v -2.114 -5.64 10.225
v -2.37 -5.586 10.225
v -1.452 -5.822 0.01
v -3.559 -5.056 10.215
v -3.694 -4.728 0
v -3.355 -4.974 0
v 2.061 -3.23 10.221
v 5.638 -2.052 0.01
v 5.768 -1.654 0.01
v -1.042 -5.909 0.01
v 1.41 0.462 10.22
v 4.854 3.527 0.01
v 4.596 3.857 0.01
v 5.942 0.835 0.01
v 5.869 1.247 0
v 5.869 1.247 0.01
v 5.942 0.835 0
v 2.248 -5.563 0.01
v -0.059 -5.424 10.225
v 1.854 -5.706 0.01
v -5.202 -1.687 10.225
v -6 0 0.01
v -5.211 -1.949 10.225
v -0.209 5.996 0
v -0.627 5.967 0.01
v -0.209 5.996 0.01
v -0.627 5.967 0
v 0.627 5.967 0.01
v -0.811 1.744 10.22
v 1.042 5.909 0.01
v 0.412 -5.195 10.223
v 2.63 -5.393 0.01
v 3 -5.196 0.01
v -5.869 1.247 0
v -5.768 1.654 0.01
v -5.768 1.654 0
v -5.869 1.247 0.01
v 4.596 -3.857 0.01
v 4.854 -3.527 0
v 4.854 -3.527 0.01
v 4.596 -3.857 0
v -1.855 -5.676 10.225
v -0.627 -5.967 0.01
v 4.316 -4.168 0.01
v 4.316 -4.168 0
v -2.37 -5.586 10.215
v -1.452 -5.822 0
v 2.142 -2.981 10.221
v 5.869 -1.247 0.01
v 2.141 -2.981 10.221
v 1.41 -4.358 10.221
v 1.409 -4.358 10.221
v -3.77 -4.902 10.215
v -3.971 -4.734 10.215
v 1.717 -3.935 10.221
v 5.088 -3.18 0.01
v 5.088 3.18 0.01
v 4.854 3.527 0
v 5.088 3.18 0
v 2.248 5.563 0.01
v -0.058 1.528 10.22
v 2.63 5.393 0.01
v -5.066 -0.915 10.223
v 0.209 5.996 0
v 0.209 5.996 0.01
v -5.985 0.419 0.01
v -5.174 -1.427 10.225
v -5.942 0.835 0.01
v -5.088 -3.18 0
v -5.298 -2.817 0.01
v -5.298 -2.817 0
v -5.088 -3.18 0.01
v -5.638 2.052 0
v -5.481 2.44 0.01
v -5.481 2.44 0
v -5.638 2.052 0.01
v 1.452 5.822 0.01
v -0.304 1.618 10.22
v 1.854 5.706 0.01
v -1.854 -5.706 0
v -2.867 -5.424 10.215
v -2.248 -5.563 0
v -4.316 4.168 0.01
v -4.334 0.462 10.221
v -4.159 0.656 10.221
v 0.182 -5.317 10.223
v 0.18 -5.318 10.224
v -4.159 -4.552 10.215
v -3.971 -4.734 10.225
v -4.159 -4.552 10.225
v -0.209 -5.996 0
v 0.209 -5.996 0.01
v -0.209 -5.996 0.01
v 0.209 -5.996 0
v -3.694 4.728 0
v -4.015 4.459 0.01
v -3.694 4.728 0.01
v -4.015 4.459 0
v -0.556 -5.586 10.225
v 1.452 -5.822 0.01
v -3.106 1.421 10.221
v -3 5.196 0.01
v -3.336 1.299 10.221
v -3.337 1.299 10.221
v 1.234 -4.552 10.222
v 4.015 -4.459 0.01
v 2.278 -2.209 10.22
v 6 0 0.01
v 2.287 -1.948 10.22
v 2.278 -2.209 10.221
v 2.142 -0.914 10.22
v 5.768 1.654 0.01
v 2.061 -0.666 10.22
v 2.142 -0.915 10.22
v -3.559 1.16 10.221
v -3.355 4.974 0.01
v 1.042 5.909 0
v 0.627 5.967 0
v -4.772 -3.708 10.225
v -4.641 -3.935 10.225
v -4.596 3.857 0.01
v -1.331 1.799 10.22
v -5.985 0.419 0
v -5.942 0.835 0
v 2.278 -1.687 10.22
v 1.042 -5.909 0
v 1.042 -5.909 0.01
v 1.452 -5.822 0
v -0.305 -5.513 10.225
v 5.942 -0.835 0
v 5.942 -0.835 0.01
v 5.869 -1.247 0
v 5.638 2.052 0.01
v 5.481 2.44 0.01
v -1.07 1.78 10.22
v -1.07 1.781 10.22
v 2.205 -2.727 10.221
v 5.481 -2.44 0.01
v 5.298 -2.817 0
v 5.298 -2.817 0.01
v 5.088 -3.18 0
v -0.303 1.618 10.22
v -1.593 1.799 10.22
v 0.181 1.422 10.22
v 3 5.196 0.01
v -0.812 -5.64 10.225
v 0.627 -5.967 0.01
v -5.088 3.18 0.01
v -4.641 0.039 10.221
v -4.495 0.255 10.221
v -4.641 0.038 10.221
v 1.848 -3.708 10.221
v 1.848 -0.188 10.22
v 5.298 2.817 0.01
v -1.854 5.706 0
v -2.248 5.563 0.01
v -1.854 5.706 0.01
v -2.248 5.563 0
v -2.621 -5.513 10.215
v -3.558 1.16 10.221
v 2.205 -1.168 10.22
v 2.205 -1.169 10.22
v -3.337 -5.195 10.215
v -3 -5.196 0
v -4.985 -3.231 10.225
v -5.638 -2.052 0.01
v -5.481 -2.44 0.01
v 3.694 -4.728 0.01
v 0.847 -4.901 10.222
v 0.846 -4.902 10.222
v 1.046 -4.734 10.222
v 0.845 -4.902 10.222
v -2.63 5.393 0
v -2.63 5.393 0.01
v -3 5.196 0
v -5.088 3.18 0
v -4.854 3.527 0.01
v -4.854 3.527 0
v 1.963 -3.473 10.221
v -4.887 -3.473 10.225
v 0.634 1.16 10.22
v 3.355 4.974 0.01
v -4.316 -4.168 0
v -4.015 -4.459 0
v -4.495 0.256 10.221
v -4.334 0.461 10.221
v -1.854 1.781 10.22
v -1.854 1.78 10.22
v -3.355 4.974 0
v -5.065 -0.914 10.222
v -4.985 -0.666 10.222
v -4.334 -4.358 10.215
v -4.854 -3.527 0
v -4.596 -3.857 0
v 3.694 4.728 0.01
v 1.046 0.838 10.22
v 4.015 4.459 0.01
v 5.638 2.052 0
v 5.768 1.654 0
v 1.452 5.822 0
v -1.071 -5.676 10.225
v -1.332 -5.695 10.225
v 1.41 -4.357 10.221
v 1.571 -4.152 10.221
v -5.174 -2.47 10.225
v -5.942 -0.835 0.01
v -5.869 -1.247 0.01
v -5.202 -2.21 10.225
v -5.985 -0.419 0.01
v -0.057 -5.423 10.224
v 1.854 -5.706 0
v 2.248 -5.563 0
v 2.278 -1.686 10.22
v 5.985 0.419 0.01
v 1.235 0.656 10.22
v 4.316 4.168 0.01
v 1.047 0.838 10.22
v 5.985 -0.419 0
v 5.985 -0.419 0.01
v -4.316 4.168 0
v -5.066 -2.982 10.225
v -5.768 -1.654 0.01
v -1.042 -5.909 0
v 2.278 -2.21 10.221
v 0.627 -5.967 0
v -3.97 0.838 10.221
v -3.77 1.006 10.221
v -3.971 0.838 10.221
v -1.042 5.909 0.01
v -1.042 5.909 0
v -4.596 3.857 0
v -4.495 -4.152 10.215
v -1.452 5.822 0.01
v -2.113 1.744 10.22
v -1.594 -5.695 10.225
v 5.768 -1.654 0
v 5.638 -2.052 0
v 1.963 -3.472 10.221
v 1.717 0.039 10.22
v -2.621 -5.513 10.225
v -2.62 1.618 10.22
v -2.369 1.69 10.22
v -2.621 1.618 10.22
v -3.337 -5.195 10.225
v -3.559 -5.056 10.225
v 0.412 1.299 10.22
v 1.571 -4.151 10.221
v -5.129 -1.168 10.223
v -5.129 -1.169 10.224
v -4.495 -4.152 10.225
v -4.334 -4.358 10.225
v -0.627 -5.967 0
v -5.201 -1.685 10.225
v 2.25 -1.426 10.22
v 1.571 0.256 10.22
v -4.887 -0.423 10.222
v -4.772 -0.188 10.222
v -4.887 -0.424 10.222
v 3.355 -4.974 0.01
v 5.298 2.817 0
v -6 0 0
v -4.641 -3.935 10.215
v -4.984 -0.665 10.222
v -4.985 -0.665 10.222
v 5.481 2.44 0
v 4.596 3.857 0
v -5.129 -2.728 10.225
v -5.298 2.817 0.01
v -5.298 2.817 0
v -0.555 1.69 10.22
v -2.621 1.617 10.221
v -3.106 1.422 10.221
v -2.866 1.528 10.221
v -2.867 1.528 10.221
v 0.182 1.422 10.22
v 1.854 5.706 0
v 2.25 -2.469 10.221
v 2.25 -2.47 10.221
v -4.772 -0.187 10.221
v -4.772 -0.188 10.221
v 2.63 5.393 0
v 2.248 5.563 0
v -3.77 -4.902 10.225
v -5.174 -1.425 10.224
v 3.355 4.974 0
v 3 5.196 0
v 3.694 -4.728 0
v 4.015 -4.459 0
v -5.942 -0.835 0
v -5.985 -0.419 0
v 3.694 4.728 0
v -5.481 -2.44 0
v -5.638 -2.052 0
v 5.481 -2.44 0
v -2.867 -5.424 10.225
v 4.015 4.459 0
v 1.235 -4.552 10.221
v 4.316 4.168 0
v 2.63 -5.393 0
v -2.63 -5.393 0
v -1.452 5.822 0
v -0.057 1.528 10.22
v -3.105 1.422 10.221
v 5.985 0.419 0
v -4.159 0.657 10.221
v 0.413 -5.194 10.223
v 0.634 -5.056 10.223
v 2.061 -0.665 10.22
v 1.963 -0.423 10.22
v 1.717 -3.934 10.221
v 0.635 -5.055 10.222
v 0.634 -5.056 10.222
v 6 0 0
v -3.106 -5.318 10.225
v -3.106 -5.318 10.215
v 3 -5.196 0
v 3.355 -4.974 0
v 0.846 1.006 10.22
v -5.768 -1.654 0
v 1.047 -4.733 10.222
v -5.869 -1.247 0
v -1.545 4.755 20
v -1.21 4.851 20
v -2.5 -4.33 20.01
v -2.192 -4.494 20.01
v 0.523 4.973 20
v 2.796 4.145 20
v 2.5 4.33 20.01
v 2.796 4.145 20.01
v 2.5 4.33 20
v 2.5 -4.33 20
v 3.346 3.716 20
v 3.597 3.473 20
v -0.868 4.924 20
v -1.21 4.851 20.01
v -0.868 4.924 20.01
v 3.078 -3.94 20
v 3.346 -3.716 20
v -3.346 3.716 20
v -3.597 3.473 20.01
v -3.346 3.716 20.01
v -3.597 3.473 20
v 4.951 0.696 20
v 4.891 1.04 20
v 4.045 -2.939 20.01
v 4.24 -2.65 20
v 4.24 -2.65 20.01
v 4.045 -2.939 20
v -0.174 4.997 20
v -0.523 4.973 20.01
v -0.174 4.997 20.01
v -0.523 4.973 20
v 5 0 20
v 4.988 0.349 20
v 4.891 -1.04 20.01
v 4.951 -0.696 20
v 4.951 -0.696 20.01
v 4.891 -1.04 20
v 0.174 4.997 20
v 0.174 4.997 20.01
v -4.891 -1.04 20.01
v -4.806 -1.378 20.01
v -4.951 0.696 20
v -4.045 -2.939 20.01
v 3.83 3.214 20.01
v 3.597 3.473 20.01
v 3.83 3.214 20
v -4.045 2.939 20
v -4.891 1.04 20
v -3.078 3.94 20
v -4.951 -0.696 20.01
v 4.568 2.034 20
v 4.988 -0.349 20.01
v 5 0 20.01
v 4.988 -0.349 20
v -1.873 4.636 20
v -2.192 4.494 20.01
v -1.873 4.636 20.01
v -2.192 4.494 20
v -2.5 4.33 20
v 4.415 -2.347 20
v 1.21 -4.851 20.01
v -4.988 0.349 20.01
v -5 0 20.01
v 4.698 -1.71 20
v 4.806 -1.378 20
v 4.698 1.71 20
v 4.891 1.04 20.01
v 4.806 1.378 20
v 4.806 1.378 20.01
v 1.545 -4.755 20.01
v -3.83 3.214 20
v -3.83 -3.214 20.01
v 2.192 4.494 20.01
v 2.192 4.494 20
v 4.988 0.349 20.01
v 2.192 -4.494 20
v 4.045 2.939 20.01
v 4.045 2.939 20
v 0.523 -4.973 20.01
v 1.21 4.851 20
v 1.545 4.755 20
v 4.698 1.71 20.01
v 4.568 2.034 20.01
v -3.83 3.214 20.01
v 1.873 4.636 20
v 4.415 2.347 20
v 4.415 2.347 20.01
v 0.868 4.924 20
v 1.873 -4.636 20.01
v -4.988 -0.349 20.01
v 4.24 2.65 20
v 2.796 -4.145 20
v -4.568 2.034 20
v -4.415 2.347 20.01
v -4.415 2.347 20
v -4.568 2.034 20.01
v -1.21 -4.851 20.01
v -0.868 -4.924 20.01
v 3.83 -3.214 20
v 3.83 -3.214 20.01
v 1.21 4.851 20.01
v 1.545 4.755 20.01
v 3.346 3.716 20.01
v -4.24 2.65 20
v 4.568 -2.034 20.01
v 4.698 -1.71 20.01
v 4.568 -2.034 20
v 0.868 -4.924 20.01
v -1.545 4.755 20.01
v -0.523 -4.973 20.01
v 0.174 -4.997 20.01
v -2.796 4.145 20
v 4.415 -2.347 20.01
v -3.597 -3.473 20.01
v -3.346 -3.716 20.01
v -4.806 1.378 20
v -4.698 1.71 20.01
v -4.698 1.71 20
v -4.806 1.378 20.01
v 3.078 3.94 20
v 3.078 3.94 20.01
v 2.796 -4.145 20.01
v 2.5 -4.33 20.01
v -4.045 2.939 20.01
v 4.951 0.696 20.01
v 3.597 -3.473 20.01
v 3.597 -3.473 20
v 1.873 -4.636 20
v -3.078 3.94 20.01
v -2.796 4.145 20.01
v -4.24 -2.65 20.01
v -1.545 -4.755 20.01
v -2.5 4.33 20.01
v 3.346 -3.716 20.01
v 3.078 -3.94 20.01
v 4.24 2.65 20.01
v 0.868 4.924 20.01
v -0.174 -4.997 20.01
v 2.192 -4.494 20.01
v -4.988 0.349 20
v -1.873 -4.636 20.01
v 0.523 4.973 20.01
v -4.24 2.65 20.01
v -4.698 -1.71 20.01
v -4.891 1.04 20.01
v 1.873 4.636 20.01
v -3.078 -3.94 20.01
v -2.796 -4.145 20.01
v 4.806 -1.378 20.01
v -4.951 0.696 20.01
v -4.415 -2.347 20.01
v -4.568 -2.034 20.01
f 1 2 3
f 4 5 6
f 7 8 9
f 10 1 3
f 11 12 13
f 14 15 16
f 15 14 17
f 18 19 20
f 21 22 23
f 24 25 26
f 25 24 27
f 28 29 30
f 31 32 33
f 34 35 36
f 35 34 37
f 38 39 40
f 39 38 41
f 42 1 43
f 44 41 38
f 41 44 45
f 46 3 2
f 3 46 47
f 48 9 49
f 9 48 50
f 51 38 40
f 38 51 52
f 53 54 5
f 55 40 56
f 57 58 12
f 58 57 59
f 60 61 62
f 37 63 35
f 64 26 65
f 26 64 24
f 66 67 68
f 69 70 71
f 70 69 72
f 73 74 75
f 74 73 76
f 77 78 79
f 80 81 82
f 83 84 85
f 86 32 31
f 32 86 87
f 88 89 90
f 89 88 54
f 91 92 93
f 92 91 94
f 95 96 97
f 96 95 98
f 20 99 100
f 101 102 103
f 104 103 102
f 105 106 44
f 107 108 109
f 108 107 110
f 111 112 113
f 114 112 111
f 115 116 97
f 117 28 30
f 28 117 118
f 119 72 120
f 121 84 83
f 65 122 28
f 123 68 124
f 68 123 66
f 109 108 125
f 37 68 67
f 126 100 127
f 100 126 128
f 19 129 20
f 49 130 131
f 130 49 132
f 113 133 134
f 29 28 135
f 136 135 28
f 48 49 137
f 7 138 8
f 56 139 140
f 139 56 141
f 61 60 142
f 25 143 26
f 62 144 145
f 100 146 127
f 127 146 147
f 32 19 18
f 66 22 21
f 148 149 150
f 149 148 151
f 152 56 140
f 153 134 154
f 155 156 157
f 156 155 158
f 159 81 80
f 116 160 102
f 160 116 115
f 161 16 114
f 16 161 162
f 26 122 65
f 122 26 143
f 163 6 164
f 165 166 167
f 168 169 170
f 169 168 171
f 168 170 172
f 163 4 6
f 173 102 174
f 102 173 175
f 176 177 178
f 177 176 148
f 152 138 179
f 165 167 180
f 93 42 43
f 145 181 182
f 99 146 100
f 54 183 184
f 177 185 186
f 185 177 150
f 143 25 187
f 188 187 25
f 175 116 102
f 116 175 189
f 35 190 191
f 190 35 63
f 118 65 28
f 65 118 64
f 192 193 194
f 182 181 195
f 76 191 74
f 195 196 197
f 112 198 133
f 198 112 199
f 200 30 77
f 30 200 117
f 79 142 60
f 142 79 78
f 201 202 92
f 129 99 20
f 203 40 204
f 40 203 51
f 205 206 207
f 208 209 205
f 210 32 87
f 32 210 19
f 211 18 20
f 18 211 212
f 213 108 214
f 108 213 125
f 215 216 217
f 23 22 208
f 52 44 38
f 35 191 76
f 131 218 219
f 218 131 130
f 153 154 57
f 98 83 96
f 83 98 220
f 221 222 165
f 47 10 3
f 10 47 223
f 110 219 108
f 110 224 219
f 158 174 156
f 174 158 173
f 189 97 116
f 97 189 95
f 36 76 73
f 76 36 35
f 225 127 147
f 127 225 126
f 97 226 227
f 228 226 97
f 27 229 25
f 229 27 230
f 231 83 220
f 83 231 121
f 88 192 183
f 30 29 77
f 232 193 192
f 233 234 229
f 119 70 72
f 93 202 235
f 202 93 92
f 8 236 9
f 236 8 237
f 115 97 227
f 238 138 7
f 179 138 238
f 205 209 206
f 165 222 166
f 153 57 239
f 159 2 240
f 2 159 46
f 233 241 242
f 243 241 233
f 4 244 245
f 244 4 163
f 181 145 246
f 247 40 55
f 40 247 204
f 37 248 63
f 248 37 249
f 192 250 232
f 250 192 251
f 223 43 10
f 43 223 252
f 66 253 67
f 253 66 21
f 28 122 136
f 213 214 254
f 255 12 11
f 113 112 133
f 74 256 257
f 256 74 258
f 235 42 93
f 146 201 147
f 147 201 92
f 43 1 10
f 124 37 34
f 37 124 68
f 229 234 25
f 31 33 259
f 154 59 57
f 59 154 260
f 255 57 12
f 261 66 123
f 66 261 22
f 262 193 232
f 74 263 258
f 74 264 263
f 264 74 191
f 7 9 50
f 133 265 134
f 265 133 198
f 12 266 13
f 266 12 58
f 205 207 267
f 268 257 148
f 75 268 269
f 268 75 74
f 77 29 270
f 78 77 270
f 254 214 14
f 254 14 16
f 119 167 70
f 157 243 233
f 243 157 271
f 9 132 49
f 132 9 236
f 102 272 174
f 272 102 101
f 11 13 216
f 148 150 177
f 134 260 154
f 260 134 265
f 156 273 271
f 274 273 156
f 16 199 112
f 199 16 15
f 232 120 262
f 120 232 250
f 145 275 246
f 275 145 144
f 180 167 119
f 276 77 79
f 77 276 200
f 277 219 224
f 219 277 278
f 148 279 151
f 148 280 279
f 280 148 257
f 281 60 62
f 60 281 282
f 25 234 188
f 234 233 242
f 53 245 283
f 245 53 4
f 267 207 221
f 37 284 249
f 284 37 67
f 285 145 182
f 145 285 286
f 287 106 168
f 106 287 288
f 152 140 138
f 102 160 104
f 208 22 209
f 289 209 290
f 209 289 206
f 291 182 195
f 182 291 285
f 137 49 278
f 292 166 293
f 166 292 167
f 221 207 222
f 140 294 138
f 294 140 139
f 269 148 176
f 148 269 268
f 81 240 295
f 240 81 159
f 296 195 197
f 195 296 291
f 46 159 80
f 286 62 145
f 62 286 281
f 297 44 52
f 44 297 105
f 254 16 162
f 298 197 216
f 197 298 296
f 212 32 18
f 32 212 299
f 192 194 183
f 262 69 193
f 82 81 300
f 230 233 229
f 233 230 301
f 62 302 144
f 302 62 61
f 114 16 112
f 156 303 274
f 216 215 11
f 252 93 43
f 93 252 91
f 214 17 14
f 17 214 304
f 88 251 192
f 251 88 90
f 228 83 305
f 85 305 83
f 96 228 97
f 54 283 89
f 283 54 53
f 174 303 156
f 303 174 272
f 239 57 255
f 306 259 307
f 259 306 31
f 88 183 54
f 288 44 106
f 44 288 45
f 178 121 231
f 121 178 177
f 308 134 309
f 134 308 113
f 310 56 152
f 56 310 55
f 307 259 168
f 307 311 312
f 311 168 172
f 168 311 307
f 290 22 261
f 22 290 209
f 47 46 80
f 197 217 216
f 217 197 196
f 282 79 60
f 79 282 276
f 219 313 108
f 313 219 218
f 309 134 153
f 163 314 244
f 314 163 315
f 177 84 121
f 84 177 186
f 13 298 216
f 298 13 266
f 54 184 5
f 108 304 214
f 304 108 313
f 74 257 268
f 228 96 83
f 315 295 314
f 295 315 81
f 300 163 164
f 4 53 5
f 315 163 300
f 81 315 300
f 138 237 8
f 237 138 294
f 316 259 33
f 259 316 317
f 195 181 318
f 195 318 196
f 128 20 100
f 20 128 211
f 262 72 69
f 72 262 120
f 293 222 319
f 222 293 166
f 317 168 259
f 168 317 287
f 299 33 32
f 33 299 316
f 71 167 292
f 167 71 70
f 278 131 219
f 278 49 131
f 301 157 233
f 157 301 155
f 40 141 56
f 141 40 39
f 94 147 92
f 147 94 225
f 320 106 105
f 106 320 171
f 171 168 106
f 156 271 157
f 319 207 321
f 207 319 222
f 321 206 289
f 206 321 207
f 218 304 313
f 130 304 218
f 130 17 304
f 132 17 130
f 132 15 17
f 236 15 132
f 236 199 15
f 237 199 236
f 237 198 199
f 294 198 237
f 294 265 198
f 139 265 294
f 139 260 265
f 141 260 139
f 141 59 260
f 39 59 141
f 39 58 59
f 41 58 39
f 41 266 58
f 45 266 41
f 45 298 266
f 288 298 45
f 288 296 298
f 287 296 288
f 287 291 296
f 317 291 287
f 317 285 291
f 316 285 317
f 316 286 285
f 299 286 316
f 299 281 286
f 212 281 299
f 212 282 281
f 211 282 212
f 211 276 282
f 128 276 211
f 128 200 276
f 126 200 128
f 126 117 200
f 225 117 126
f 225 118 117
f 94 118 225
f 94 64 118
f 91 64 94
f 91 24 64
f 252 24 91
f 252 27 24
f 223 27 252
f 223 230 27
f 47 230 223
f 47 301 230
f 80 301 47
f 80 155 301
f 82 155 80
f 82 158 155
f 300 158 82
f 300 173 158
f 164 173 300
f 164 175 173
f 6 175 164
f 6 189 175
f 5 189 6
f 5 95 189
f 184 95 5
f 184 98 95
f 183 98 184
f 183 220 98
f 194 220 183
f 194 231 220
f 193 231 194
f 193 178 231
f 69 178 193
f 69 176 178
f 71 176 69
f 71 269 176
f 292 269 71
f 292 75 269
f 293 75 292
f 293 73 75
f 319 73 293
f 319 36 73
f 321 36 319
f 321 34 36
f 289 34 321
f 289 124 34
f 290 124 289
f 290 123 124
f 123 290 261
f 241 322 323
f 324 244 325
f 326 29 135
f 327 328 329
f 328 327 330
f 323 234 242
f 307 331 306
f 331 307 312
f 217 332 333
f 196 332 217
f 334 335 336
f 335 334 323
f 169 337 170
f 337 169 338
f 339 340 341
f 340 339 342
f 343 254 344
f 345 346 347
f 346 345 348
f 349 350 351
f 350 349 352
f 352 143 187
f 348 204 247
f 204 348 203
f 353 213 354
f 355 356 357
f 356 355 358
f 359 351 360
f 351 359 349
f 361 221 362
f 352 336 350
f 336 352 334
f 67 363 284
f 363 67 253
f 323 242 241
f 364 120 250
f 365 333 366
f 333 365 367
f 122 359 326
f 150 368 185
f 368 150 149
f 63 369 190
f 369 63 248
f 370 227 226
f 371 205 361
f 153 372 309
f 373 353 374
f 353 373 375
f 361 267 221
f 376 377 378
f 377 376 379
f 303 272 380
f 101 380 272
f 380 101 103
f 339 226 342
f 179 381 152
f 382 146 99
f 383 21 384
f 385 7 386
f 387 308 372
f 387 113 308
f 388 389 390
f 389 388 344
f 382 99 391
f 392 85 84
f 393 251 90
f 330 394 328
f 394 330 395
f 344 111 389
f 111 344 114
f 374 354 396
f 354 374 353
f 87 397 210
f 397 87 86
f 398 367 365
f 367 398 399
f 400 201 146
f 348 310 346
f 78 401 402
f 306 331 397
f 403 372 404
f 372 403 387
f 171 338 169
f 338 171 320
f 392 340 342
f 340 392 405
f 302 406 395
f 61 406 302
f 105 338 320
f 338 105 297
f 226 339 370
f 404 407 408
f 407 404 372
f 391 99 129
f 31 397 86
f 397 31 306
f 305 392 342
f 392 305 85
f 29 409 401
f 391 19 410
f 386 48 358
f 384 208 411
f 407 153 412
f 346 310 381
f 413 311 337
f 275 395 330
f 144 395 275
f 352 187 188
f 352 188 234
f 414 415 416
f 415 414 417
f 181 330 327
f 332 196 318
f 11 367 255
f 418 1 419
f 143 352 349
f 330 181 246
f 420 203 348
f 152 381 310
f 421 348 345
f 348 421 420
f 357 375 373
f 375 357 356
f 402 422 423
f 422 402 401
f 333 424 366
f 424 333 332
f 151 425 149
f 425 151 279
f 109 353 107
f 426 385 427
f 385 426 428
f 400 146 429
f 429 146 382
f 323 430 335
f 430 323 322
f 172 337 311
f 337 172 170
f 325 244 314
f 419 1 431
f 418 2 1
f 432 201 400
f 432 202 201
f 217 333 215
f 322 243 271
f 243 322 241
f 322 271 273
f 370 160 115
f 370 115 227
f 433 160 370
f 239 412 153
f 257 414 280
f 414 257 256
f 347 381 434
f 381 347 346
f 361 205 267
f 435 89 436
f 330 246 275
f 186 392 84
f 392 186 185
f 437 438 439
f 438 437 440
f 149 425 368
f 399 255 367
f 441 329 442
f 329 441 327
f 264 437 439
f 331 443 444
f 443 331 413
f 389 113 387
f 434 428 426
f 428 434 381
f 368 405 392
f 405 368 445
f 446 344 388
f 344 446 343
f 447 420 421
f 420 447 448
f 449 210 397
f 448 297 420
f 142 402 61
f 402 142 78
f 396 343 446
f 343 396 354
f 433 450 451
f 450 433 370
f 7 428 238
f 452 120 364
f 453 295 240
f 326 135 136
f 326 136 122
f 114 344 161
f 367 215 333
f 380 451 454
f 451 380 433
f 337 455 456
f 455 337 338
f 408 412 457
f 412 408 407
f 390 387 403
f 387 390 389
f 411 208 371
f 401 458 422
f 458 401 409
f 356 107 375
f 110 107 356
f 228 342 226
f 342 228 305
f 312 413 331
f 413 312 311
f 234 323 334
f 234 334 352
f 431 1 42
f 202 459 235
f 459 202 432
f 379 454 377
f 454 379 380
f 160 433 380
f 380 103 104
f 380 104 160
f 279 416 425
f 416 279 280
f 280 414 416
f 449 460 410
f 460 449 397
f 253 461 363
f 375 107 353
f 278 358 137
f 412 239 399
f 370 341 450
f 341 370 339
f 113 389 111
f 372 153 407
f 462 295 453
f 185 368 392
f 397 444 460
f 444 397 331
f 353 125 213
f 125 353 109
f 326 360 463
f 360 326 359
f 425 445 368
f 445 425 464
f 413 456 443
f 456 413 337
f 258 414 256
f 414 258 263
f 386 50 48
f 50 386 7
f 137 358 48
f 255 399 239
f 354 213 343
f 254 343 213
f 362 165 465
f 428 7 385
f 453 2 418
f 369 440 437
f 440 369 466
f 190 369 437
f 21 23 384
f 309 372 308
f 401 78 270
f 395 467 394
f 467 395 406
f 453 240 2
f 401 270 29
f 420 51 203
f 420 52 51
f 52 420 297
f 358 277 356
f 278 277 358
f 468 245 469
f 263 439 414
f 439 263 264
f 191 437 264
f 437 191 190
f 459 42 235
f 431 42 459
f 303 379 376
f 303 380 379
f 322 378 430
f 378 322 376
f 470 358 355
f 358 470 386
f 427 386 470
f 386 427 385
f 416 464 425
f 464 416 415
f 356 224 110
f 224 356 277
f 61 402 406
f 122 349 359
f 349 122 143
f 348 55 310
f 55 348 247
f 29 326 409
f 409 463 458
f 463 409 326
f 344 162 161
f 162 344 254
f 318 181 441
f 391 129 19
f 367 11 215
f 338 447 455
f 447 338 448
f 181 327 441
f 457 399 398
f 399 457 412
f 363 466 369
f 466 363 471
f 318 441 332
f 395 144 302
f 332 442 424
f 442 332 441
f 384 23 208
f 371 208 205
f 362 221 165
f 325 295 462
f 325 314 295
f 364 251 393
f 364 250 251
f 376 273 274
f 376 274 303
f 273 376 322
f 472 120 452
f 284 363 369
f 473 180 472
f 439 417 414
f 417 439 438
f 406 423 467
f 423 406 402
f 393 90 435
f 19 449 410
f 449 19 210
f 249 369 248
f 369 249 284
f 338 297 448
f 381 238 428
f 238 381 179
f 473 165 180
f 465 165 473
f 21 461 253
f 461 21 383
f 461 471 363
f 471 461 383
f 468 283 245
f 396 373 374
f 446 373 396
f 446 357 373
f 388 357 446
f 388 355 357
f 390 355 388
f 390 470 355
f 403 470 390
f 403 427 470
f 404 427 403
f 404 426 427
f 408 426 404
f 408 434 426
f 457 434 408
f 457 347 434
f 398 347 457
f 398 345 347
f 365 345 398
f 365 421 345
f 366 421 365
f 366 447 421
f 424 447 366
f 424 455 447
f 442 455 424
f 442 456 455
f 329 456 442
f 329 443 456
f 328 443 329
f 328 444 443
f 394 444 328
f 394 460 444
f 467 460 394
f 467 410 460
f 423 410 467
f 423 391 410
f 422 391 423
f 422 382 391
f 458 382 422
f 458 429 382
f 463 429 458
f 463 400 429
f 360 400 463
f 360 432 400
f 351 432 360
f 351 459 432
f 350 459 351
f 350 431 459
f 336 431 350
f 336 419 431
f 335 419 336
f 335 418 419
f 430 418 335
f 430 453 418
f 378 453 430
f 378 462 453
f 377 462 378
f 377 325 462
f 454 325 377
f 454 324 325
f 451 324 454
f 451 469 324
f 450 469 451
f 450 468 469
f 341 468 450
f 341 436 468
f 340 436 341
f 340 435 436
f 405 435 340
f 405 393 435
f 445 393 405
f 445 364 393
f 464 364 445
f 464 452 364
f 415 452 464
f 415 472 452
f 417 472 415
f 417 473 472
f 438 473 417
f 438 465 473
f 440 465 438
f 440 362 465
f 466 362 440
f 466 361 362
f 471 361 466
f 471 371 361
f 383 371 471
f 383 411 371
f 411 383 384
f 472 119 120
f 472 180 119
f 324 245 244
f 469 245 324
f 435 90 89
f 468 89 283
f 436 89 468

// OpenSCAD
$fn = 90;

//Parametrics: change as you want them -----------------intersection!!!


xBottom                 = 0;   
yBottom                 = 0;  
zBottom                 = 0;

xTop                    = 0;
yTop                    = 0;
zTop                    = 20;

   
rTop                    = 5;
rBottom                 = 6;


resolution              = 1;

//alphaTop                =
//alphaBottom             =




planeHeight             = 0.01;


rCenterOffsetFactor     = 0.1;
xyCenterOffsetFactor    = 0.1;
zCenterOffsetFactor     = 0.1;


//========================================= modules
module cylinderPlane(pX, pY, pZ, pH, pR) {
    translate([pX, pY, pZ]) {
        cylinder(h=pH,r=pR);
    }
}




//========================================= calculations
height                  = zTop-zBottom;

rCenterOffset           = height*rCenterOffsetFactor;
xyCenterOffset          = height*xyCenterOffsetFactor;
zCenterOffset           = height*zCenterOffsetFactor;

rCenter                 = rands(((rTop+rBottom)/2)-rCenterOffset/2,((rTop+rBottom)/2)+rCenterOffset,1)[0]/2;

centerX                 = rands((((xBottom+xTop)/2)-xyCenterOffset),((xBottom+xTop)/2)+xyCenterOffset,1)[0];
centerY                 = rands((((yBottom+yTop)/2)-xyCenterOffset),((yBottom+yTop)/2)+xyCenterOffset,1)[0];
centerZ                 = rands((((zBottom+zTop)/2)-zCenterOffset),((zBottom+zTop)/2)+zCenterOffset,1)[0];



hull() {
   cylinderPlane(xBottom,yBottom,zBottom,planeHeight,rBottom);
   cylinderPlane(centerX,centerY,centerZ,planeHeight,rCenter);
}
hull() {
    cylinderPlane(centerX,centerY,centerZ,planeHeight,rCenter);
    cylinderPlane(xTop,yTop,zTop,planeHeight,rTop);
}


//========================================= debug output
echo("rCenter",rCenter);
echo ("centerX",centerX);
echo ("centerY",centerY);
